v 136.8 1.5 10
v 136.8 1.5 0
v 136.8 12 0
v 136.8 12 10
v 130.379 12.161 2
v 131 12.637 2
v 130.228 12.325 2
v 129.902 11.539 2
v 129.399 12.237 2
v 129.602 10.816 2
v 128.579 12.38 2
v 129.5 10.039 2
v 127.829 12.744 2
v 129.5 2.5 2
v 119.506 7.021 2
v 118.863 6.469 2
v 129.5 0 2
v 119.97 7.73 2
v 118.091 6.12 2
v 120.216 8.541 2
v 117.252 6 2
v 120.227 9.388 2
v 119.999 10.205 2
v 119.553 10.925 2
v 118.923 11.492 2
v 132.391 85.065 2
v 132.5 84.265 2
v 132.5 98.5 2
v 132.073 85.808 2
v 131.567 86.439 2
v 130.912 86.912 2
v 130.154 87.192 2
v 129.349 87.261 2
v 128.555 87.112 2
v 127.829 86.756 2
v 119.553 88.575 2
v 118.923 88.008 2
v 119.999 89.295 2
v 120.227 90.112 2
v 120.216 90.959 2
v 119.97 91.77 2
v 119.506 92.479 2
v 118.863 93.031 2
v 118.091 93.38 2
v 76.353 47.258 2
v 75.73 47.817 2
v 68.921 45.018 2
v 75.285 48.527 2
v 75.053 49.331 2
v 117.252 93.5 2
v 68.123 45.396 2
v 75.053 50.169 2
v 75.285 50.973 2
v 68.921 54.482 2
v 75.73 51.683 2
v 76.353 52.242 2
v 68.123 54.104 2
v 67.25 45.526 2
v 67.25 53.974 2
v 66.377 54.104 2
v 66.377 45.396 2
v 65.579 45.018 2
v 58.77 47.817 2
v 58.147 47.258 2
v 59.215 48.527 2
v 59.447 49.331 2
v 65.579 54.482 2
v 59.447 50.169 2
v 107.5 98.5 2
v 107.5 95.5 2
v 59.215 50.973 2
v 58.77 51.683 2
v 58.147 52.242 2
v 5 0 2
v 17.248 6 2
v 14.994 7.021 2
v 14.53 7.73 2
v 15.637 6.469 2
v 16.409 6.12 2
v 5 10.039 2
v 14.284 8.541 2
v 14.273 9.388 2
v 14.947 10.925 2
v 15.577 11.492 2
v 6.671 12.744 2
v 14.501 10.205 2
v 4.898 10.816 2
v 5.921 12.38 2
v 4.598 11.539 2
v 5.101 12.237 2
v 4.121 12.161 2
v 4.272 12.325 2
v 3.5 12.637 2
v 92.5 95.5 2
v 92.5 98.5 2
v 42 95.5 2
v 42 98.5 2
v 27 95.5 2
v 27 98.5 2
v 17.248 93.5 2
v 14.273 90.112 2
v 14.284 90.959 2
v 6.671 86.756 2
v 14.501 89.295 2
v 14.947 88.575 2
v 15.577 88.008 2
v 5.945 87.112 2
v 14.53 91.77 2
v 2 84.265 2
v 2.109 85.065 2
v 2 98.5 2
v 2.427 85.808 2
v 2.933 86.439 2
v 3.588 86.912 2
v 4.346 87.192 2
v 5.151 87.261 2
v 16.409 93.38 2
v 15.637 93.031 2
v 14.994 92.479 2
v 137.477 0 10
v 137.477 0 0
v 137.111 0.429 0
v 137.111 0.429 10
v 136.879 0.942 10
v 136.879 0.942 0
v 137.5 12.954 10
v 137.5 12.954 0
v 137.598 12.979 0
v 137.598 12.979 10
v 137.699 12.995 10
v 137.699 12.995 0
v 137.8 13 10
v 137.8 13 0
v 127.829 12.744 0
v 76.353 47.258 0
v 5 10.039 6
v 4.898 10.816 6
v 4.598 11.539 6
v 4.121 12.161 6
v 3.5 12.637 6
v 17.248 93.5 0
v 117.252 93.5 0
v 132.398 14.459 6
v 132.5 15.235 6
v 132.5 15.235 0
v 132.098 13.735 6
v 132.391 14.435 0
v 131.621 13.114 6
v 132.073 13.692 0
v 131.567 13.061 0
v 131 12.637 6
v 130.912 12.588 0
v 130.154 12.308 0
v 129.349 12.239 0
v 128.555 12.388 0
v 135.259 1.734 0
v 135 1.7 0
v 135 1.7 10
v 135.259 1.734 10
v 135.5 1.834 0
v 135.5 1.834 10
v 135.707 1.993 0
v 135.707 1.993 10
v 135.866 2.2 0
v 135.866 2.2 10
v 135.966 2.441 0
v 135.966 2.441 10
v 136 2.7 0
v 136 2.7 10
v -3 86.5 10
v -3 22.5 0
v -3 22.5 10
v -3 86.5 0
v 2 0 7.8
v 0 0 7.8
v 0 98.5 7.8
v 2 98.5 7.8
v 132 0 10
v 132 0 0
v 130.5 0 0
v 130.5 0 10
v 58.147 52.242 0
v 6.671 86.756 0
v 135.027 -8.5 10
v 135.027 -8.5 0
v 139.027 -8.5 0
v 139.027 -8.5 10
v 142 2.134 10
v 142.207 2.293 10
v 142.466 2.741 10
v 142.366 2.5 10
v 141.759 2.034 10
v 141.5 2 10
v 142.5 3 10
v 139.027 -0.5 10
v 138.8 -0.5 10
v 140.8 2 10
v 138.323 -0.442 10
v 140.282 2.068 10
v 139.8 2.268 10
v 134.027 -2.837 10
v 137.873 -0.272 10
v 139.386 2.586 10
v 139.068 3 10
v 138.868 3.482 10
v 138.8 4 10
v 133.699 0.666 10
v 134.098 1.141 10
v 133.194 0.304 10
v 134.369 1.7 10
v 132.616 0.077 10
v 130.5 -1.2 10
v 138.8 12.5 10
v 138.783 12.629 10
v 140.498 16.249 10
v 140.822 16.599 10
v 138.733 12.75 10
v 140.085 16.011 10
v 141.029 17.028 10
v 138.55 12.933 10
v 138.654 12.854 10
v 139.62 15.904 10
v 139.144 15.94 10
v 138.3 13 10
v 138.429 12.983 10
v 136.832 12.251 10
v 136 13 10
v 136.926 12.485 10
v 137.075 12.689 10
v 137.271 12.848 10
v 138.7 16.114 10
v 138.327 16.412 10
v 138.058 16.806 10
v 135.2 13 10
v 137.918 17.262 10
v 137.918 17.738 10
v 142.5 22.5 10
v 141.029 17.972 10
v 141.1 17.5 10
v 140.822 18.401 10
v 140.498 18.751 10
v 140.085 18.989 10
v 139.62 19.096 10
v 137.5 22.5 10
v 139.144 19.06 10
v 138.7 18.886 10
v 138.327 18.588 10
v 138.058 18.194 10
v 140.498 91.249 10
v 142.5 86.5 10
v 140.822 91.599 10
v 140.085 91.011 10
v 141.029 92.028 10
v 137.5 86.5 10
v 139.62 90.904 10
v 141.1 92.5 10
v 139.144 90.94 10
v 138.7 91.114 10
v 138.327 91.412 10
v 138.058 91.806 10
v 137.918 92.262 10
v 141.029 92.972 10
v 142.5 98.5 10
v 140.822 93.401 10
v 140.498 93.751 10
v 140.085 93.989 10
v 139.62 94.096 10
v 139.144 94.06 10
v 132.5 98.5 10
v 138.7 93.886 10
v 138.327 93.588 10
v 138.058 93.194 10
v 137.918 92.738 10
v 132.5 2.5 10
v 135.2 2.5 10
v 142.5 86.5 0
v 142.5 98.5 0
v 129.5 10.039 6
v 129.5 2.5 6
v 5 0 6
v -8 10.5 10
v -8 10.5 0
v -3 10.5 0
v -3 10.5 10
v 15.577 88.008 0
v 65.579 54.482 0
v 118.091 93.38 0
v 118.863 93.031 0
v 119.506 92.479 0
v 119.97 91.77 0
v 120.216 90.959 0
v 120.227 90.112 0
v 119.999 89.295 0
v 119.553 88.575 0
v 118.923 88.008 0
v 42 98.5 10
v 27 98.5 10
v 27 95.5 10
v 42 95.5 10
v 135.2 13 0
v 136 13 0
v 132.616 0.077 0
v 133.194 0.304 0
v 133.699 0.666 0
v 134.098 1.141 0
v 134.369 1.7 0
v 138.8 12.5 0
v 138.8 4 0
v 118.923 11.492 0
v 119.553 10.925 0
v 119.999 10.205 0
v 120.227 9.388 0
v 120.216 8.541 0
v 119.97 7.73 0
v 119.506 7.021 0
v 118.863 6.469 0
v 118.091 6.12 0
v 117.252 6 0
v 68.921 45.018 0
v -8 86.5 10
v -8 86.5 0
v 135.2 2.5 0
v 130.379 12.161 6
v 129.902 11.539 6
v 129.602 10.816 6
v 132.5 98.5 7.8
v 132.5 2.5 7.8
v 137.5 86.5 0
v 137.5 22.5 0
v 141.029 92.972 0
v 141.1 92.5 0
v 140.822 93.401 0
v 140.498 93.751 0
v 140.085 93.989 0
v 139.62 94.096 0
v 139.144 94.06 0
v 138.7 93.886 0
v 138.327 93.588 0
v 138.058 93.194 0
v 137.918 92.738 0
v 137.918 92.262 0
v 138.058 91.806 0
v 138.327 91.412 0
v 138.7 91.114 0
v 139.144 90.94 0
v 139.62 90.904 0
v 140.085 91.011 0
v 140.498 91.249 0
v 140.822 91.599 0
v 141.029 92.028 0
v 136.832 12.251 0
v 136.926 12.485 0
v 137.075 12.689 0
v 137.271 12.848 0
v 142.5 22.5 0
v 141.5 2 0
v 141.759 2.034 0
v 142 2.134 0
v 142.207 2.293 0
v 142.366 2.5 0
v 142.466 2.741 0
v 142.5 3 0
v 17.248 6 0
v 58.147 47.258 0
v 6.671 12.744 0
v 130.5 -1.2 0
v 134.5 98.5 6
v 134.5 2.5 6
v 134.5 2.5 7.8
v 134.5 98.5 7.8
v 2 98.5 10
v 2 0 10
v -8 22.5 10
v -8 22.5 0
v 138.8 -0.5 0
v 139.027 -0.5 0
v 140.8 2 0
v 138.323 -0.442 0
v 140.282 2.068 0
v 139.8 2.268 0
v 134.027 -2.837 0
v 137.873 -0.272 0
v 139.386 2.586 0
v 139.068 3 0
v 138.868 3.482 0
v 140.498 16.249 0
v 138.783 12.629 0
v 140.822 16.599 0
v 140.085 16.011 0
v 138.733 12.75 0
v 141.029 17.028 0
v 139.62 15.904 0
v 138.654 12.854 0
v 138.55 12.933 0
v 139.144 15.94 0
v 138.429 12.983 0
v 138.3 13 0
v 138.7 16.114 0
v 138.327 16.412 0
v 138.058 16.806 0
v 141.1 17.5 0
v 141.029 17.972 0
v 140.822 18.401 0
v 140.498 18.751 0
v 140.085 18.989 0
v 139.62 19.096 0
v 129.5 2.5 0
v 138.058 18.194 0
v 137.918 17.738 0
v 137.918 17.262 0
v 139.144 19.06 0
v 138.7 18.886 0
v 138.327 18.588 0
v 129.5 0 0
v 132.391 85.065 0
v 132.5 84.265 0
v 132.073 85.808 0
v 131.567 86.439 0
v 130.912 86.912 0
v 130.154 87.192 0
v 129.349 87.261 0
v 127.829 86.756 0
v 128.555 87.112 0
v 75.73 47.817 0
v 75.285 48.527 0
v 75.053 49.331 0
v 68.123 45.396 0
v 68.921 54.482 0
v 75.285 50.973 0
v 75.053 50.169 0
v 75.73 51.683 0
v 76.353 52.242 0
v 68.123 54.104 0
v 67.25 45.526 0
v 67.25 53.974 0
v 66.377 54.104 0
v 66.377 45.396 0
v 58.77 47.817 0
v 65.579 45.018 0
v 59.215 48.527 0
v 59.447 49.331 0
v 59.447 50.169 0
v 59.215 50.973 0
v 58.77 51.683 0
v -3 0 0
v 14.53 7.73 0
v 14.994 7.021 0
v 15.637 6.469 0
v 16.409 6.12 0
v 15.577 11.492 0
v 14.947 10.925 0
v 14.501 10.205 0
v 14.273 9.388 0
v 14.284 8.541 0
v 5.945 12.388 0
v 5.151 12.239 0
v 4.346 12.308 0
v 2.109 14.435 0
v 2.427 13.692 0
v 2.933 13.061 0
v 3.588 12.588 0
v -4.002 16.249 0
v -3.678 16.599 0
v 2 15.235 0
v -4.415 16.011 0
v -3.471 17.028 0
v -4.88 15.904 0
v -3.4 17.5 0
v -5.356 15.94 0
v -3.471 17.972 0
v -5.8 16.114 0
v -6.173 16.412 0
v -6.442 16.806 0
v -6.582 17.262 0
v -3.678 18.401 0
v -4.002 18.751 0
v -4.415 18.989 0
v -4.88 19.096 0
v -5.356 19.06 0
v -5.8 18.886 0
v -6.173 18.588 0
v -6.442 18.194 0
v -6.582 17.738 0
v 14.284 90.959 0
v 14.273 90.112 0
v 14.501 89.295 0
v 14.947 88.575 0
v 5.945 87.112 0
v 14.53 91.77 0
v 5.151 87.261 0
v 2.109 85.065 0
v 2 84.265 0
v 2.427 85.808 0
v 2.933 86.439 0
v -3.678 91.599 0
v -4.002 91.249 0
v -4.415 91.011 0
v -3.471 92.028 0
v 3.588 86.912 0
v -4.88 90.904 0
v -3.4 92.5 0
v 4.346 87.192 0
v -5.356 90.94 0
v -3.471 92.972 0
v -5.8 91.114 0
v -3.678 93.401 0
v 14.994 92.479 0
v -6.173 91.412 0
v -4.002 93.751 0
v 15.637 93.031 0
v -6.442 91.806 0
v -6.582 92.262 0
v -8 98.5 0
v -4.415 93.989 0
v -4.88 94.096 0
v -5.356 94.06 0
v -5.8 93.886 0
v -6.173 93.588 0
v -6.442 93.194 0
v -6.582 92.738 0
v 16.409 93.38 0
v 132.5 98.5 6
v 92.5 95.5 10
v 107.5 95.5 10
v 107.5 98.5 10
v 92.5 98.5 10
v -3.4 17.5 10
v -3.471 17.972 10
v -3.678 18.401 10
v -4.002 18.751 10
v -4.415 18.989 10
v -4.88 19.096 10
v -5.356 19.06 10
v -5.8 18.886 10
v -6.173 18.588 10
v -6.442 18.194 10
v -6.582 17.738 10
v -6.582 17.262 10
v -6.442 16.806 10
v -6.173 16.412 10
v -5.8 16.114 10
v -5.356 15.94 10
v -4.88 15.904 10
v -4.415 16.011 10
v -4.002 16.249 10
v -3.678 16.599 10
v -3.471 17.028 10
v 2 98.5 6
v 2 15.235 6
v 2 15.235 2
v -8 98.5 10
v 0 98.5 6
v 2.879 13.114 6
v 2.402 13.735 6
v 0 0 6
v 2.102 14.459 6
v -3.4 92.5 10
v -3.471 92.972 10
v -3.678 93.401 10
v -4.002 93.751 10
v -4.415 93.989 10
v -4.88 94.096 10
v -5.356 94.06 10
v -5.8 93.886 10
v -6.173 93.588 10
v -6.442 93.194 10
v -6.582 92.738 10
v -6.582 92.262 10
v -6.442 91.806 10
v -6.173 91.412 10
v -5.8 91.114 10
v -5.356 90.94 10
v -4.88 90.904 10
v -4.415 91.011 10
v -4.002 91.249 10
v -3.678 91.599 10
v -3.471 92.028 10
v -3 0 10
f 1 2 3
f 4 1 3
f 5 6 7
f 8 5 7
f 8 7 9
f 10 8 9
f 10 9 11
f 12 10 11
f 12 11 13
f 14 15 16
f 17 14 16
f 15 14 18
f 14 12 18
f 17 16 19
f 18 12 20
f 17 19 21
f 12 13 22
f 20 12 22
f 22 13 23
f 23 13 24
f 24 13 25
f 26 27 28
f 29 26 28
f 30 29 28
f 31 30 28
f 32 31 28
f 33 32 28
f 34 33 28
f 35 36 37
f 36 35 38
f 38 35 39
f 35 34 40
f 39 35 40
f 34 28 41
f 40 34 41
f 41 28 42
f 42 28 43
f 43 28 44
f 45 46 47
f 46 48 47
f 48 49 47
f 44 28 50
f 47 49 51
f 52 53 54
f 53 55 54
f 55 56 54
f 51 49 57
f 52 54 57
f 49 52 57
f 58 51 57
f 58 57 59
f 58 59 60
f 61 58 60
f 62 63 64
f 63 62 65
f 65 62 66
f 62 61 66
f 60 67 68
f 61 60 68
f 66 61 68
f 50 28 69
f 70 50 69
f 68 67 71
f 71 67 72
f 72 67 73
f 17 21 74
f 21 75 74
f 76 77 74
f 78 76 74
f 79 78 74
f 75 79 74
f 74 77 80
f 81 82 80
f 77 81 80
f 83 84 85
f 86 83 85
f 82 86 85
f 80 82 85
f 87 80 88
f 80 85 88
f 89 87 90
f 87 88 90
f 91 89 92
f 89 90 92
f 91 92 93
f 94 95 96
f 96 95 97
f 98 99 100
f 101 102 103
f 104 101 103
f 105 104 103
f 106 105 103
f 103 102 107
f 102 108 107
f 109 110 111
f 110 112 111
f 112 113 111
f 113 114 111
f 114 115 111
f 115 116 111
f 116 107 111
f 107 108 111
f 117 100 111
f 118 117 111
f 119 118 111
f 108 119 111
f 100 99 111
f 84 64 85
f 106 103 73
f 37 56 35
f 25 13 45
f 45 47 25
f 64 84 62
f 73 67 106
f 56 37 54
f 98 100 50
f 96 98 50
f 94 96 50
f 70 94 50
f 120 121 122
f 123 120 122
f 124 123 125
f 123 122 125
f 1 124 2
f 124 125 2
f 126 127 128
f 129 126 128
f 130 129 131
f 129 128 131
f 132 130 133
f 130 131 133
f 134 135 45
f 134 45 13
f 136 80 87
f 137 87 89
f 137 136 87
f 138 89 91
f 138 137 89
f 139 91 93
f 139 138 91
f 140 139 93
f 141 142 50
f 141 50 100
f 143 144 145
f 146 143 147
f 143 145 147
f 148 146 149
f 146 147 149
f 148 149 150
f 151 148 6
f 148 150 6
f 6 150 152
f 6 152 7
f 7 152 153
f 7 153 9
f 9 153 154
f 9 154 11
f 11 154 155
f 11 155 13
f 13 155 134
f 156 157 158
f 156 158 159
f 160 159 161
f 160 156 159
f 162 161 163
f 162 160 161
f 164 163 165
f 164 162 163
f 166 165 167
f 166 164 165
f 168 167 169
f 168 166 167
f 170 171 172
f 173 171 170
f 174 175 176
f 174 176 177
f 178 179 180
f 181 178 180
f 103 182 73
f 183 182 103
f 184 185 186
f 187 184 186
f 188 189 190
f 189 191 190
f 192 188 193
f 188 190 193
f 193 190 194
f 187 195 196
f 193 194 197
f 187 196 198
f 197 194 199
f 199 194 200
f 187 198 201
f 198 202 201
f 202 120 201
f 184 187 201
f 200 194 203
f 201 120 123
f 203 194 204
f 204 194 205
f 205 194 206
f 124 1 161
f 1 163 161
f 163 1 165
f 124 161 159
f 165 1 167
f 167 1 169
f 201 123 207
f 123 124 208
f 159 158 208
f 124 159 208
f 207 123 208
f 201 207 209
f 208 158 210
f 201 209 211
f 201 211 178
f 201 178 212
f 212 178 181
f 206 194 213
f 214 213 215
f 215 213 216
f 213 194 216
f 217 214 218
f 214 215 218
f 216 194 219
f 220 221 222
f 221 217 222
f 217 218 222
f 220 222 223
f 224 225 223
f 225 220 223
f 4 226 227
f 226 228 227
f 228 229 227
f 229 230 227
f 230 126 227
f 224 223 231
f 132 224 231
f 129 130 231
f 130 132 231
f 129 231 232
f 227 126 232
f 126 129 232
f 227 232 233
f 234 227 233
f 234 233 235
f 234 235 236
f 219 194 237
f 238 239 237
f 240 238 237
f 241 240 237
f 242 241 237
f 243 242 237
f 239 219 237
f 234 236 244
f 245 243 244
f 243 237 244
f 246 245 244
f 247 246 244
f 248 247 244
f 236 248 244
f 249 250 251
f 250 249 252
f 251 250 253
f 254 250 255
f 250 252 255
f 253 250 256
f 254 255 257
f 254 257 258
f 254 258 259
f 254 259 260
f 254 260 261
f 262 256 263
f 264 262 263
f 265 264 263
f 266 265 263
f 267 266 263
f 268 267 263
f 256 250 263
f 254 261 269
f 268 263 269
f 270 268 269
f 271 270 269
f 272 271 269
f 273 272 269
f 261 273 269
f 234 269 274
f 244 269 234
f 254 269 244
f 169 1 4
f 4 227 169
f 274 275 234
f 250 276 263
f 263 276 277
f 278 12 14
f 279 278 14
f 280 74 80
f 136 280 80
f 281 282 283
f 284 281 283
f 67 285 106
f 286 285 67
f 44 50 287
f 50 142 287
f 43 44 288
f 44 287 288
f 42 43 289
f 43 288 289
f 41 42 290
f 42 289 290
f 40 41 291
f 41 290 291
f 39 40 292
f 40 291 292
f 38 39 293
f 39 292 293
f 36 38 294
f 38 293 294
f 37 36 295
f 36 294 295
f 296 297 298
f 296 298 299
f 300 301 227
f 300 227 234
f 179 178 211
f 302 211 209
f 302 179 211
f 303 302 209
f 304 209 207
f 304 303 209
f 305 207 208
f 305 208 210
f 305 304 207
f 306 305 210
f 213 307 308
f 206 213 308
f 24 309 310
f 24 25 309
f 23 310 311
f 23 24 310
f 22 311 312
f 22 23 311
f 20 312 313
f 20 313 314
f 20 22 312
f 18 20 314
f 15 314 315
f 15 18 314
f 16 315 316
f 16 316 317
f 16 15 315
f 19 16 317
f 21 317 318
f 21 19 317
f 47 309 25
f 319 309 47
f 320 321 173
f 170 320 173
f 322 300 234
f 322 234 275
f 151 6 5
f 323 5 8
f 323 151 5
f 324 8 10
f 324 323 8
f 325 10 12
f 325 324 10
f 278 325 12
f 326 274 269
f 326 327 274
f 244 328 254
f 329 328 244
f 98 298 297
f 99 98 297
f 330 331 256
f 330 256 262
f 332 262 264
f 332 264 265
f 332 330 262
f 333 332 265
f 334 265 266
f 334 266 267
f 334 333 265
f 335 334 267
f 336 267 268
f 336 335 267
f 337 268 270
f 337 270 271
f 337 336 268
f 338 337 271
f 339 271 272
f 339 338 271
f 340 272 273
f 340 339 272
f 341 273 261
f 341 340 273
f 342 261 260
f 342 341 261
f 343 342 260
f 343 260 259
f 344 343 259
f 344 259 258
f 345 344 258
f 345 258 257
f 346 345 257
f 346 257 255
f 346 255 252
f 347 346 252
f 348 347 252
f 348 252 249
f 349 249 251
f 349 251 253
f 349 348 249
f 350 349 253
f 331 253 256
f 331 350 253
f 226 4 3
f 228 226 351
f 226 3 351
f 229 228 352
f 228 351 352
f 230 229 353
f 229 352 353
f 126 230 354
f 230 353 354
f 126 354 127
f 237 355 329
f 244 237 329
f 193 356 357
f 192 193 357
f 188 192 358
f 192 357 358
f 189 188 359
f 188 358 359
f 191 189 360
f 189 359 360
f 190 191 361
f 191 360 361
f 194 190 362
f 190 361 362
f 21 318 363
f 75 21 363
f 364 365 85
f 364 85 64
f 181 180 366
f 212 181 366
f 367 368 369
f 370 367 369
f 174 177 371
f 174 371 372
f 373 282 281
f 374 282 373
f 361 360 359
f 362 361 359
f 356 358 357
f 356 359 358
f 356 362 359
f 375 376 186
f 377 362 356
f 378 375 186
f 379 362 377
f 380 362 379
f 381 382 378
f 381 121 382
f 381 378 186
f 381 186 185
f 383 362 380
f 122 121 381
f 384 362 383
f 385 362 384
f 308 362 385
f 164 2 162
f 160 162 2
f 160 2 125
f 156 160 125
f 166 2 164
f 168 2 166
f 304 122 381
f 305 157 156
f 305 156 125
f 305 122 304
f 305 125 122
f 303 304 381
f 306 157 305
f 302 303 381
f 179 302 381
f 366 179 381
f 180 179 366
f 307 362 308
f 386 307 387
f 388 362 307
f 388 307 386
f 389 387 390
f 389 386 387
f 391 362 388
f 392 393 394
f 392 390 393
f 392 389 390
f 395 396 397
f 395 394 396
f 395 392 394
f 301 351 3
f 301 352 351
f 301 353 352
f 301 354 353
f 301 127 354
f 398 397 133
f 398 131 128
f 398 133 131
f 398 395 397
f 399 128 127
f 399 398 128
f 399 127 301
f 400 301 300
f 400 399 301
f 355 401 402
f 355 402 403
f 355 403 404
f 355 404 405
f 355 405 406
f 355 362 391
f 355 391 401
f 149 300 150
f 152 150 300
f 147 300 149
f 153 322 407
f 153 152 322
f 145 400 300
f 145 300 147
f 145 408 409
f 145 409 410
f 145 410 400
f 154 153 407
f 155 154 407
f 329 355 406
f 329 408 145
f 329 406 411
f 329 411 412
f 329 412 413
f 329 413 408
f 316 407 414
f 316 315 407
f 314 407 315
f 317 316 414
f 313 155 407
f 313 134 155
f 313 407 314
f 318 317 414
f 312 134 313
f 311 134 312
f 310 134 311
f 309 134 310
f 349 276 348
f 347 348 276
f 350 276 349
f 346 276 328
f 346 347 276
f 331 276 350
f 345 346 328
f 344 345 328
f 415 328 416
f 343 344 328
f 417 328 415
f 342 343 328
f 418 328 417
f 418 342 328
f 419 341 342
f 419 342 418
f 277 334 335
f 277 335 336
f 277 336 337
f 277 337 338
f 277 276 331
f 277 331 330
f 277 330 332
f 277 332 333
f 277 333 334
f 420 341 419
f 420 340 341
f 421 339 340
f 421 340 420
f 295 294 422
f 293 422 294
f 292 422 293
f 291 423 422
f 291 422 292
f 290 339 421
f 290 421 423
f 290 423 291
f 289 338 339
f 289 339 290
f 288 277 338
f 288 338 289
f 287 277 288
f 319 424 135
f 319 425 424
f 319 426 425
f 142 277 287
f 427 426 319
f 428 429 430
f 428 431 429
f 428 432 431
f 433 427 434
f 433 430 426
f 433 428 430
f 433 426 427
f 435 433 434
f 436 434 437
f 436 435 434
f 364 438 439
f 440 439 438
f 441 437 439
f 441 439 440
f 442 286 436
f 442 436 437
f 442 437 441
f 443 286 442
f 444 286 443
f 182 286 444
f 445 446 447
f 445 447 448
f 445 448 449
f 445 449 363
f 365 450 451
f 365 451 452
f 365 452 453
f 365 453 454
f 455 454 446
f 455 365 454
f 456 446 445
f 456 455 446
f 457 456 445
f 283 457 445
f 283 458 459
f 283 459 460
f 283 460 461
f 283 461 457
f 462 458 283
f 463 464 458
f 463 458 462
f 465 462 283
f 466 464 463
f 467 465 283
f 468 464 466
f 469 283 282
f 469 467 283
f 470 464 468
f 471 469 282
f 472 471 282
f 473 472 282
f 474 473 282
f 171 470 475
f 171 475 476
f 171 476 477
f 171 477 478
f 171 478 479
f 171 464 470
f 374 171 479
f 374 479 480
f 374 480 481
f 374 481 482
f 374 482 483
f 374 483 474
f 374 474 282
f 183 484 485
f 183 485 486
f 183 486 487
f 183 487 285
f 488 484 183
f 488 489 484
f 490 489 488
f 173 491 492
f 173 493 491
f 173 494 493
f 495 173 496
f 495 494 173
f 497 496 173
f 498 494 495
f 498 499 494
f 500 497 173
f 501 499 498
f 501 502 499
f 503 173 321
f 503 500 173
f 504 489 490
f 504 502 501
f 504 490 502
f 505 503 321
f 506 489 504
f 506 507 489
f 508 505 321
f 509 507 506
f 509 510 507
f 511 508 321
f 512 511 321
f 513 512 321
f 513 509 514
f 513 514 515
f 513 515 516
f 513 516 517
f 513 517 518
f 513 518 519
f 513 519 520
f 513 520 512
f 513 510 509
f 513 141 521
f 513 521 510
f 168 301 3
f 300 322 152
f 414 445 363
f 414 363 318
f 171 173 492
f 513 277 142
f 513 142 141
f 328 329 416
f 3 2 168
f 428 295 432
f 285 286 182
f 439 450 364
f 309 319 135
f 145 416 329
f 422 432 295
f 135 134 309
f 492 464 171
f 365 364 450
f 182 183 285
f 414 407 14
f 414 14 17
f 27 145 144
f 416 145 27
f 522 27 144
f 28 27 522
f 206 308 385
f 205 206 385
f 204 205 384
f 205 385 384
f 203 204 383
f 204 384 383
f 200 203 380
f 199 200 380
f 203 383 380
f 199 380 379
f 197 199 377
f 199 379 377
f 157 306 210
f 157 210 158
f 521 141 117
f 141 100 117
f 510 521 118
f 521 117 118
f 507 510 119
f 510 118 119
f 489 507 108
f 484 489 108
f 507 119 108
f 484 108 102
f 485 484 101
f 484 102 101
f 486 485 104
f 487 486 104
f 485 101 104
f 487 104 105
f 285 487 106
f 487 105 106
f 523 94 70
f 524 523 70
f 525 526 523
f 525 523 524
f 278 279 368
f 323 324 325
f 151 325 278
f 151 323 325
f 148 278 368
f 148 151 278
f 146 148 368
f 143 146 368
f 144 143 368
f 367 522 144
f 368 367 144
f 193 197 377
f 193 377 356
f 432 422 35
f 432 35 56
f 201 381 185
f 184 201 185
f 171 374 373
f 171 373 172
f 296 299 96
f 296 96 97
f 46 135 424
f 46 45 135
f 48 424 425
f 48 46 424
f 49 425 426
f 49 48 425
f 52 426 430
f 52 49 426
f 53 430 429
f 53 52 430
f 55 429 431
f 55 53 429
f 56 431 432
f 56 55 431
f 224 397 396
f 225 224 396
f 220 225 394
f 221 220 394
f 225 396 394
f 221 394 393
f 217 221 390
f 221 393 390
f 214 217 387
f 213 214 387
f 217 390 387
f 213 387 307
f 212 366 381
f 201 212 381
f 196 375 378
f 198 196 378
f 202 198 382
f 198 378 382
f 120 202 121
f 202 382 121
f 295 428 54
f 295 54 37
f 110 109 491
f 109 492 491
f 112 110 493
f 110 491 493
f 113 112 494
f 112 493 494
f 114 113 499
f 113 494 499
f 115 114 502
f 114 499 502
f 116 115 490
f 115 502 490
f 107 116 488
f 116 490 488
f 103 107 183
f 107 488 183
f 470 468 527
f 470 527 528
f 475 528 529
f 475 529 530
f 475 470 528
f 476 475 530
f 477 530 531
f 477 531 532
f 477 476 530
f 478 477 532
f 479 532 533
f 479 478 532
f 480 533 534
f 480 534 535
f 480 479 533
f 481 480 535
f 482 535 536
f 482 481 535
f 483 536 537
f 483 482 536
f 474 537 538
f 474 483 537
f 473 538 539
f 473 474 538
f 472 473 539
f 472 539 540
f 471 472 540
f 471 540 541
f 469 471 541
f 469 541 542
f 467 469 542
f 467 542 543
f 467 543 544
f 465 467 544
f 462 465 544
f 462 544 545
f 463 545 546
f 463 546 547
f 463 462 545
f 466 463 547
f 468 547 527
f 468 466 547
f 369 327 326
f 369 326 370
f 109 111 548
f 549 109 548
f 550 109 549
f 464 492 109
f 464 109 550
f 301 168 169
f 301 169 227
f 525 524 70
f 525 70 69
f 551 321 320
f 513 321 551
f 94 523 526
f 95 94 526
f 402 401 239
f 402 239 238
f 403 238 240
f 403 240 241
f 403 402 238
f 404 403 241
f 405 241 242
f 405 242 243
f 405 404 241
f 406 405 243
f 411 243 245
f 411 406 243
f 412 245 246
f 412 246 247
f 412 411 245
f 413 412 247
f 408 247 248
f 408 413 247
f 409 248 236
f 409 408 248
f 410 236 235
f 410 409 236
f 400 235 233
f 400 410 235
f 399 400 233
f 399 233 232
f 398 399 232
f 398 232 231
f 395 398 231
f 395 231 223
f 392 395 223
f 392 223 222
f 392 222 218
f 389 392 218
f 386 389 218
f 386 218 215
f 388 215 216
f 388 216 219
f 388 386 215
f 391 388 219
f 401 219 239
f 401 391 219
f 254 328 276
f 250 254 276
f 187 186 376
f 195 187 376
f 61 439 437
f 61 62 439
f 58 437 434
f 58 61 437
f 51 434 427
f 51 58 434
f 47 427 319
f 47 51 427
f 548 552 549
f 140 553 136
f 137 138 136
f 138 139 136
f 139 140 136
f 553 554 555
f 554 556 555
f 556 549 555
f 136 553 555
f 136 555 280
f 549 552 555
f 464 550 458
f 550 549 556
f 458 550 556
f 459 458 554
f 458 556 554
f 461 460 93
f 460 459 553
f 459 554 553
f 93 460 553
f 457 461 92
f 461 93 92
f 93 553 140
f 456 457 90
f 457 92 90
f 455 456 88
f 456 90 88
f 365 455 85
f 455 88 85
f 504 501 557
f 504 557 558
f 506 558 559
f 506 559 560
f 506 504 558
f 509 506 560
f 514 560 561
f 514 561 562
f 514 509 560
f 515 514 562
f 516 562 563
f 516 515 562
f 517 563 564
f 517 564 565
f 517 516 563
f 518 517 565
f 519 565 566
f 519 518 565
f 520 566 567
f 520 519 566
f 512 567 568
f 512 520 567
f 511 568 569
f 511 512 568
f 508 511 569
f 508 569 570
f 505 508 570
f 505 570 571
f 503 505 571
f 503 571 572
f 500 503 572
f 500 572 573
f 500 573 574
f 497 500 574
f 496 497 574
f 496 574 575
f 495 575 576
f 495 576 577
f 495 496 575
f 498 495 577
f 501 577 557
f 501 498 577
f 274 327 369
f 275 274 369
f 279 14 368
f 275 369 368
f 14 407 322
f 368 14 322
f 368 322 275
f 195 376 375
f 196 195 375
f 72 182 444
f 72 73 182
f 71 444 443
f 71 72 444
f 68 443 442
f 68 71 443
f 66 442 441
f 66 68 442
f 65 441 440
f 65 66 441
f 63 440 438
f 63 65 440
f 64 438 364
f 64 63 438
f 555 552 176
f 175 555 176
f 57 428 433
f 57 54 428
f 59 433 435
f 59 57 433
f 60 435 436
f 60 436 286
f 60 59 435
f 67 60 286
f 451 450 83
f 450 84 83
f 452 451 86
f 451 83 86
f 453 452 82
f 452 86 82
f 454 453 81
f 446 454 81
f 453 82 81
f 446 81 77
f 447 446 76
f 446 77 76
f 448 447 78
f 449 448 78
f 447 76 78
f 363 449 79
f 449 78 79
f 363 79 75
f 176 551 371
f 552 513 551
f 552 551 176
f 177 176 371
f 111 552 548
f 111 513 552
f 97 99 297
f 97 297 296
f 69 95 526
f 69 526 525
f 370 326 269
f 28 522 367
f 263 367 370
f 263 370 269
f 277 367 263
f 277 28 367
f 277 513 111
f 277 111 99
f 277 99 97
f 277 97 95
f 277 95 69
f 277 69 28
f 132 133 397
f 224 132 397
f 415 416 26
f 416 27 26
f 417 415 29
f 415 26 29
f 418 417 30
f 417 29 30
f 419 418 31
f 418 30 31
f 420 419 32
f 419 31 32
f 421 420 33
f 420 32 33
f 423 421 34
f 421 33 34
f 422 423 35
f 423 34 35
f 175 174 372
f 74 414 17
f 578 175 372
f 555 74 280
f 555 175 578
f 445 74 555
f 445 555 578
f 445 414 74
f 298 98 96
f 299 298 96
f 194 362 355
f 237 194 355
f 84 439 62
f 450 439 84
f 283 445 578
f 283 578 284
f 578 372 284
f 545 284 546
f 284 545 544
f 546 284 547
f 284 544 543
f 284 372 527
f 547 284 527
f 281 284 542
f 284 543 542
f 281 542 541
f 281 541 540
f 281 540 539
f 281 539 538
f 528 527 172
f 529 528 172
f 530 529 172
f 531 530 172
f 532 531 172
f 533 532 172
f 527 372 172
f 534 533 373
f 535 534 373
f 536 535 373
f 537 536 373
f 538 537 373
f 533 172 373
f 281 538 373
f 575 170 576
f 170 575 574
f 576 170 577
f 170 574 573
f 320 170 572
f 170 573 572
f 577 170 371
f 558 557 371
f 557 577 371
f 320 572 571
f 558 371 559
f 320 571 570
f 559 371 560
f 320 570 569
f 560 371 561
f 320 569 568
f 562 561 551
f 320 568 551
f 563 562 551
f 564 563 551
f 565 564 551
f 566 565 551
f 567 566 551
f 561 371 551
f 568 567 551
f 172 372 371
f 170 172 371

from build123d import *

# Parameters (mm, degrees)
BOSS_EXTRUDE1_DEPTH     = 10
SKETCH3_W               = 134.5
SKETCH3_H               = 1.8
CUT_EXTRUDE1_DEPTH      = 170.435828561
SKETCH5_W               = 140.5
SKETCH5_H               = 6
BOSS_EXTRUDE3_DEPTH     = 2
CUT_EXTRUDE2_DEPTH      = 170.435828561
FILLET1_R               = 3
BOSS_EXTRUDE2_OUTLINE_W = 5
BOSS_EXTRUDE2_OUTLINE_H = 12
BOSS_EXTRUDE2_OUTLINE_R = 1.6
BOSS_EXTRUDE2_DEPTH     = 10
SKETCH7_W               = 130.5
SKETCH7_H               = 5
CUT_EXTRUDE3_DEPTH      = 8
SKETCH8_W               = 15
SKETCH8_H               = 3
BOSS_EXTRUDE4_DEPTH     = 8
BOSS_EXTRUDE5_DEPTH     = 4
FILLET2_R               = 3


# Read off the part's stored shape, not the designer's step: Boss-Extrude2
with BuildPart() as part:
    # Sketch2 → Boss-Extrude1 (new body)
    with BuildSketch(Plane.XY):
        Polygon((2, 0), (-3, 0), (-3, 98.5), (137.5, 98.5), (137.5, 0), (132.5, 0), (132.5, 93.5), (2, 93.5), align=None)
    extrude(amount=BOSS_EXTRUDE1_DEPTH)

    # Sketch3 → Cut-Extrude1 (cut, through all)
    with BuildSketch(Plane.XZ):
        with Locations((67.25, 6.9)):
            Rectangle(SKETCH3_W, SKETCH3_H)
    extrude(amount=-CUT_EXTRUDE1_DEPTH, mode=Mode.SUBTRACT)

    # Sketch5 → Boss-Extrude3 (add)
    with BuildSketch(Plane(origin=(0, 0, 0), x_dir=(-1, 0, 0), z_dir=(0, 0, -1))):
        with Locations((-67.25, 3)):
            Rectangle(SKETCH5_W, SKETCH5_H)
        Polygon((-0.329295866, 8.49173588), (-130.829295866, 95.99173588), (-134.170704134, 91.00826412), (-3.670704134, 3.50826412), align=None)
        Polygon((-3.670704134, 95.99173588), (-134.170704134, 8.49173588), (-130.829295866, 3.50826412), (-0.329295866, 91.00826412), align=None)
    extrude(amount=-BOSS_EXTRUDE3_DEPTH)

    # Sketch4 → Cut-Extrude2 (cut, through all)
    with BuildSketch(Plane.XY):
        with BuildLine():
            ThreePointArc((132, 0), (133.457737974, 0.468990399), (134.368543856, 1.7))
            Line((134.368543856, 1.7), (135, 1.7))
            ThreePointArc((135, 1.7), (135.707106781, 1.992893219), (136, 2.7))
            Line((136, 2.7), (136, 13))
            Line((136, 13), (135.2, 13))
            Line((135.2, 13), (135.2, 2.5))
            Line((135.2, 2.5), (129.5, 2.5))
            Line((129.5, 2.5), (129.5, 0))
            Line((129.5, 0), (130.5, 0))
            Line((130.5, 0), (132, 0))
        make_face()
        with BuildLine():
            ThreePointArc((141.5, 2), (142.207106781, 2.292893219), (142.5, 3))
            Line((142.5, 3), (142.5, -0.5))
            Line((142.5, -0.5), (139.0272352, -0.5))
            Line((139.0272352, -0.5), (138.8, -0.5))
            ThreePointArc((138.8, -0.5), (137.385786438, 0.085786438), (136.8, 1.5))
            Line((136.8, 1.5), (136.8, 12))
            ThreePointArc((136.8, 12), (137.092893219, 12.707106781), (137.8, 13))
            Line((137.8, 13), (138.3, 13))
            ThreePointArc((138.3, 13), (138.653553391, 12.853553391), (138.8, 12.5))
            Line((138.8, 12.5), (138.8, 4))
            ThreePointArc((138.8, 4), (139.385786438, 2.585786438), (140.8, 2))
            Line((140.8, 2), (141.5, 2))
        make_face()
    extrude(amount=CUT_EXTRUDE2_DEPTH, mode=Mode.SUBTRACT)

    # Fillet1
    fillet1_edges = [part.edges().sort_by_distance(p)[0] for p in [
        (132.5, 89.888060199, 1),
        (72.636950218, 49.75, 1),
        (61.863049782, 49.75, 1),
        (67.25, 53.361939801, 1),
        (2, 89.888060199, 1),
        (127.113049782, 93.5, 1),
        (7.386950218, 6, 1),
        (2, 9.611939801, 1),
        (132.5, 9.611939801, 1),
        (67.25, 46.138060199, 1),
        (127.113049782, 6, 1),
        (7.386950218, 93.5, 1),
    ]]
    fillet(fillet1_edges, radius=FILLET1_R)

    # Boss-Extrude2 outline → Boss-Extrude2 (add)
    # profile 1 of 5: a face of its own
    with BuildSketch(Plane.XY):
        with BuildLine():
            Line((134.5, 1.7), (134.368543856, 1.7))
            ThreePointArc((134.368543856, 1.7), (133.457737974, 0.468990399), (132, 0))
            Line((132, 0), (130.5, 0))
            Line((130.5, 0), (130.5, -1.2))
            Line((130.5, -1.2), (134.0272352, -2.83697044))
            Line((134.0272352, -2.83697044), (135.0272352, -8.5))
            Line((135.0272352, -8.5), (139.0272352, -8.5))
            Line((139.0272352, -8.5), (139.0272352, -0.5))
            Line((139.0272352, -0.5), (138.8, -0.5))
            ThreePointArc((138.8, -0.5), (138.092893219, -0.370828693), (137.477124345, 1e-09))
            Line((137.477124345, 1e-09), (134.5, 0))
            Line((134.5, 0), (134.5, 1.7))
        make_face()
    # profile 2 of 5: a face of its own
    with BuildSketch(Plane.XY):
        with Locations((-5.5, 16.5)):
            Rectangle(BOSS_EXTRUDE2_OUTLINE_W, BOSS_EXTRUDE2_OUTLINE_H)
        with Locations((-5, 17.5)):
            Circle(BOSS_EXTRUDE2_OUTLINE_R, mode=Mode.SUBTRACT)
    # profile 3 of 5: a face of its own
    with BuildSketch(Plane.XY):
        with Locations((-5.5, 92.5)):
            Rectangle(BOSS_EXTRUDE2_OUTLINE_W, BOSS_EXTRUDE2_OUTLINE_H)
        with Locations((-5, 92.5)):
            Circle(BOSS_EXTRUDE2_OUTLINE_R, mode=Mode.SUBTRACT)
    # profile 4 of 5: a face of its own
    with BuildSketch(Plane.XY):
        with Locations((140, 92.5)):
            Rectangle(BOSS_EXTRUDE2_OUTLINE_W, BOSS_EXTRUDE2_OUTLINE_H)
        with Locations((139.5, 92.5)):
            Circle(BOSS_EXTRUDE2_OUTLINE_R, mode=Mode.SUBTRACT)
    # profile 5 of 5: a face of its own
    with BuildSketch(Plane.XY):
        with BuildLine():
            Line((137.8, 13), (138.3, 13))
            ThreePointArc((138.3, 13), (138.653553391, 12.853553391), (138.8, 12.5))
            Line((138.8, 12.5), (138.8, 4))
            ThreePointArc((138.8, 4), (139.385786438, 2.585786438), (140.8, 2))
            Line((140.8, 2), (141.5, 2))
            ThreePointArc((141.5, 2), (142.207106781, 2.292893219), (142.5, 3))
            Line((142.5, 3), (142.5, 22.5))
            Line((142.5, 22.5), (137.5, 22.5))
            Line((137.5, 22.5), (137.5, 12.953939201))
            ThreePointArc((137.5, 12.953939201), (137.648242301, 12.988417726), (137.8, 13))
        make_face()
        with Locations((139.5, 17.5)):
            Circle(BOSS_EXTRUDE2_OUTLINE_R, mode=Mode.SUBTRACT)
    extrude(amount=BOSS_EXTRUDE2_DEPTH)

    # Sketch7 → Cut-Extrude3 (cut)
    with BuildSketch(Plane.XY.offset(10)):
        with Locations((67.25, 96)):
            Rectangle(SKETCH7_W, SKETCH7_H)
    extrude(amount=-CUT_EXTRUDE3_DEPTH, mode=Mode.SUBTRACT)

    # Sketch8 → Boss-Extrude4 (add)
    with BuildSketch(Plane.XY.offset(2)):
        with Locations((34.5, 97)):
            Rectangle(SKETCH8_W, SKETCH8_H)
        with Locations((100, 97)):
            Rectangle(SKETCH8_W, SKETCH8_H)
    extrude(amount=BOSS_EXTRUDE4_DEPTH)

    # Sketch9 → Boss-Extrude5 (add)
    with BuildSketch(Plane.XY.offset(2)):
        with BuildLine():
            ThreePointArc((132.5, 15.235373856), (131.621320344, 13.114053512), (129.5, 12.235373856))
            Line((129.5, 12.235373856), (129.5, 2.5))
            Line((129.5, 2.5), (132.5, 2.5))
            Line((132.5, 2.5), (132.5, 15.235373856))
        make_face()
        with BuildLine():
            Line((2, 0), (5, 0))
            Line((5, 0), (5, 12.235373856))
            ThreePointArc((5, 12.235373856), (2.878679656, 13.114053512), (2, 15.235373856))
            Line((2, 15.235373856), (2, 0))
        make_face()
    extrude(amount=BOSS_EXTRUDE5_DEPTH)

    # Fillet2
    fillet2_edges = [part.edges().sort_by_distance(p)[0] for p in [
        (5, 12.235373856, 4),
        (129.5, 12.235373856, 4),
    ]]
    fillet(fillet2_edges, radius=FILLET2_R)


solid = part.part
